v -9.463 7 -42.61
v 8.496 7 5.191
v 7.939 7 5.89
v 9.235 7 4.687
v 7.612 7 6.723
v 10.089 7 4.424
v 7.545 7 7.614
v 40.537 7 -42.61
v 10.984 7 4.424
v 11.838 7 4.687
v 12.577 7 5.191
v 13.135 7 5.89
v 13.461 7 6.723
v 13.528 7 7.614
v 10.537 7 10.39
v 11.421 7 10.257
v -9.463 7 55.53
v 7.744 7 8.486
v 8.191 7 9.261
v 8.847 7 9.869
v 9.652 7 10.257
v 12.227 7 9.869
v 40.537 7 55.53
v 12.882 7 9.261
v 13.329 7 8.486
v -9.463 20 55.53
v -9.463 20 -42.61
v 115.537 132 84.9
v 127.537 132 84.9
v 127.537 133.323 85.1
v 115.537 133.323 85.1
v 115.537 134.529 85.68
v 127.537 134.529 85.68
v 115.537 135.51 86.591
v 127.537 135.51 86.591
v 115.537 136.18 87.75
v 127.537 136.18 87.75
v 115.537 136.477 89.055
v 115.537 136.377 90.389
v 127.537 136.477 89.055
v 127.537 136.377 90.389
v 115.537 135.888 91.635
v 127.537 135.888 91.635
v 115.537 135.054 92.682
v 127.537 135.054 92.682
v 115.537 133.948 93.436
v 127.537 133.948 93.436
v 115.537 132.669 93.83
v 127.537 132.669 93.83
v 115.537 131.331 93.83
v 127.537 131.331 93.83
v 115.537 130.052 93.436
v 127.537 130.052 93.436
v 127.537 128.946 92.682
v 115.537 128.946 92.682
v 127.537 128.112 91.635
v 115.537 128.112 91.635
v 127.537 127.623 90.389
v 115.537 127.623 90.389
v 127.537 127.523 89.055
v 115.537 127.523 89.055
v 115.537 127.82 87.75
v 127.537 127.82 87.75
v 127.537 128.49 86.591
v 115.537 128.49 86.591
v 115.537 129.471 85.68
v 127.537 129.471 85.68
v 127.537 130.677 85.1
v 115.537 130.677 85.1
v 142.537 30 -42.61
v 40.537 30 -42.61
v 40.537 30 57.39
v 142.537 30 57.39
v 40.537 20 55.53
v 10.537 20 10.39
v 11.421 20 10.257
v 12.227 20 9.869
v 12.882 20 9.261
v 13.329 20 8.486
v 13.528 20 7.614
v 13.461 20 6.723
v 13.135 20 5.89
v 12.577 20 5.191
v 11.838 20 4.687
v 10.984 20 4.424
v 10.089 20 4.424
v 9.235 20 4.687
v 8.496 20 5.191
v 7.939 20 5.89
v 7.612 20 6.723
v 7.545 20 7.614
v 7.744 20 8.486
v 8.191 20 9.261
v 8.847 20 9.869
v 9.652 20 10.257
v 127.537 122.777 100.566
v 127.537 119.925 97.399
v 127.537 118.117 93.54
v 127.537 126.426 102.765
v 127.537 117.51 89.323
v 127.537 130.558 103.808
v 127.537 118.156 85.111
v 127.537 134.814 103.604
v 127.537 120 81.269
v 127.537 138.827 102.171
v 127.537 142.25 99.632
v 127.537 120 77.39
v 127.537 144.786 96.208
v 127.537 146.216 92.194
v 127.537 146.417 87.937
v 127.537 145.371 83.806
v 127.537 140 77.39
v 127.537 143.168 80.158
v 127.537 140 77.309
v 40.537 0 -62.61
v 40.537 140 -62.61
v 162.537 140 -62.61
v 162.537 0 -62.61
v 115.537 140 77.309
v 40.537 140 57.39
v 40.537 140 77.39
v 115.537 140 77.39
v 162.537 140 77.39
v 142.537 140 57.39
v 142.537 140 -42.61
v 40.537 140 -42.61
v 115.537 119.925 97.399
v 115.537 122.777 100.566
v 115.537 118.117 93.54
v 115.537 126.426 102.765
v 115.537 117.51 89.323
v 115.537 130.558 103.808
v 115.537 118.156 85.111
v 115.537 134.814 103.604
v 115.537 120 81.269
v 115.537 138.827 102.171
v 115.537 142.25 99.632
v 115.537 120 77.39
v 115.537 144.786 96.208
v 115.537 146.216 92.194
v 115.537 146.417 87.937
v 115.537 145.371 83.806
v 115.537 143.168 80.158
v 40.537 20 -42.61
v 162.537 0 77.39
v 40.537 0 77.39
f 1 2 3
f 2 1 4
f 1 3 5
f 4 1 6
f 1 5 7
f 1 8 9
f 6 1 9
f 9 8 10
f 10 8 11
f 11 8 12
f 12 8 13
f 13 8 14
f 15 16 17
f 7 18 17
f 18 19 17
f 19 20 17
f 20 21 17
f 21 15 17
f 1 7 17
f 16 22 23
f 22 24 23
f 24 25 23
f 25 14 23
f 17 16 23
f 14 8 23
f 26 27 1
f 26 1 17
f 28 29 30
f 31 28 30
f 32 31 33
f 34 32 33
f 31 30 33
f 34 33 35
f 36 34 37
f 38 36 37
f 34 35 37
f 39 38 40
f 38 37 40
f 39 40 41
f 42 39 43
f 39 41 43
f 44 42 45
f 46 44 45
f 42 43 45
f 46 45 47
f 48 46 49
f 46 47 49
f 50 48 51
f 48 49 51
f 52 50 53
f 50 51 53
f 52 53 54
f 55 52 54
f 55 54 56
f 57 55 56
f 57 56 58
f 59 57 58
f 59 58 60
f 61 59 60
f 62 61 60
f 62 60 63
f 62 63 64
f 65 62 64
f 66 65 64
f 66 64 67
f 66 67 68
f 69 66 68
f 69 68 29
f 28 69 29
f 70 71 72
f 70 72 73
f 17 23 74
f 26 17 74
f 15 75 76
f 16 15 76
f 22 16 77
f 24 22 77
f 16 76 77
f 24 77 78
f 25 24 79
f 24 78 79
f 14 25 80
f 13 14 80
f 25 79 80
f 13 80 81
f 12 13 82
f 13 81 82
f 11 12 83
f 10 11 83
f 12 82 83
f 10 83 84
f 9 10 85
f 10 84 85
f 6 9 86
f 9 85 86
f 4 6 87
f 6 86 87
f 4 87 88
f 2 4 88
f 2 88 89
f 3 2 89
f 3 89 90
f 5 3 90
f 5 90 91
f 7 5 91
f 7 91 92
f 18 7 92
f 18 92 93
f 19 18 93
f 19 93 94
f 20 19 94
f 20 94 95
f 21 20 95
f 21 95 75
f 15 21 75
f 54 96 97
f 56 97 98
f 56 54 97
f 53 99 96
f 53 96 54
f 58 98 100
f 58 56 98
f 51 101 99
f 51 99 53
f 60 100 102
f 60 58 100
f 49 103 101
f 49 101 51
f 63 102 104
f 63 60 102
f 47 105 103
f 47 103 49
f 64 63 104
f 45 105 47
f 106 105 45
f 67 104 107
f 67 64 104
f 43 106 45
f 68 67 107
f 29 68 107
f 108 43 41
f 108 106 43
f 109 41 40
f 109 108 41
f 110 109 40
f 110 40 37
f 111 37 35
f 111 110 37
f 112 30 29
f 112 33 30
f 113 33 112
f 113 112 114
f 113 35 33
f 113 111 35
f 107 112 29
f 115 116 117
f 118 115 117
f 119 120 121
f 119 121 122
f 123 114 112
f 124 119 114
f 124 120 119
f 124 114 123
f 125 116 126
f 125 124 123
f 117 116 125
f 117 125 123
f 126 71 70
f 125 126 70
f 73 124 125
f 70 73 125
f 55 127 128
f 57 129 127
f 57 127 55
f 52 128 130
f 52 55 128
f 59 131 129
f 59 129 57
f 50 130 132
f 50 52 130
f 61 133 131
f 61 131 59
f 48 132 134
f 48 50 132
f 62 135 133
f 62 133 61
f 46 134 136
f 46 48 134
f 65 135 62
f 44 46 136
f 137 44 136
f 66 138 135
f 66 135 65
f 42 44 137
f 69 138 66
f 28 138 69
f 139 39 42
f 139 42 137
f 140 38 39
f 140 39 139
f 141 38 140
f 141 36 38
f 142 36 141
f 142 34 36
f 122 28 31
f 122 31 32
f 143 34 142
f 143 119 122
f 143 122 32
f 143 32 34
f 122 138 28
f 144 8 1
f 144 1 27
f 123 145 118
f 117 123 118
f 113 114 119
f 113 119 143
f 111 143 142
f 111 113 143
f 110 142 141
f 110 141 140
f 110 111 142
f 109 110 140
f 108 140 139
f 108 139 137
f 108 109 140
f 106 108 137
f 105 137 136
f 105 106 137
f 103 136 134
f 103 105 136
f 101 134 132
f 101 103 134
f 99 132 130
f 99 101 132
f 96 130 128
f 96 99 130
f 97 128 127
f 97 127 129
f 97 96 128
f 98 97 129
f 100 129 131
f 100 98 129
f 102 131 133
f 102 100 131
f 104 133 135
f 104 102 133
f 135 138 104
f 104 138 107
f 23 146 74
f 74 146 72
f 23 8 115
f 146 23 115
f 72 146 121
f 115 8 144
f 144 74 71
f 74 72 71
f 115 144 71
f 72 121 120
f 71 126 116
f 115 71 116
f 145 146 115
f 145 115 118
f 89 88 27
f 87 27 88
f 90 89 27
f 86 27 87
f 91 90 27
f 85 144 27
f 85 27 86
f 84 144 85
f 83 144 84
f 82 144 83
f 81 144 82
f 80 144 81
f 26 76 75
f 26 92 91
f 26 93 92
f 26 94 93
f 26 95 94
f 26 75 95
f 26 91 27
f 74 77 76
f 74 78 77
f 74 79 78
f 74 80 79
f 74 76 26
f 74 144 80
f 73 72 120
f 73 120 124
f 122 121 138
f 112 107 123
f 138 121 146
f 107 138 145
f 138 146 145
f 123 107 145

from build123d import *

# Parameters (mm, degrees)
SKETCH_1_W          = 272
SKETCH_1_H          = 140
EXTRUDE_1_DEPTH     = 140
SKETCH_2_W          = 252
SKETCH_2_H          = 100
CUT_EXTRUDE_1_DEPTH = 110
SKETCH_8_W          = 12
SKETCH_8_H          = 12
EXTRUDE_2_DEPTH     = 10
SKETCH_9_R          = 14.49
SKETCH_9_R_2        = 4.49
EXTRUDE_1_2_DEPTH   = 12
SKETCH_11_R         = 4.49
CUT_EXTRUDE_5_DEPTH = 298.354040116
SKETCH_13_W         = 150
SKETCH_13_H         = 140
CUT_EXTRUDE_7_DEPTH = 239.346904019
SKETCH_14_W         = 98.139384751
SKETCH_14_H         = 13
EXTRUDE_3_DEPTH     = 50
SKETCH_15_R         = 3
CUT_EXTRUDE_8_DEPTH = 231.670688982


with BuildPart() as part:
    # 草圖1 → Extrude 1 (new body)
    with BuildSketch(Plane(origin=(0, 0, 0), x_dir=(1, 0, 0), z_dir=(0, 1, 0))):
        with Locations((26.536585366, -7.390243902)):
            Rectangle(SKETCH_1_W, SKETCH_1_H)
    extrude(amount=EXTRUDE_1_DEPTH)

    # 草圖2 → 除料-伸長1 (cut)
    with BuildSketch(Plane(origin=(0, 140, 0), x_dir=(1, 0, 0), z_dir=(0, 1, 0))):
        with Locations((16.536585366, -7.390243902)):
            Rectangle(SKETCH_2_W, SKETCH_2_H)
    extrude(amount=-CUT_EXTRUDE_1_DEPTH, mode=Mode.SUBTRACT)

    # 草圖8 → 填料-伸長2 (add)
    with BuildSketch(Plane.XY.offset(77.390243902)):
        with Locations((121.536585366, 126)):
            Rectangle(SKETCH_8_W, SKETCH_8_H)
    extrude(amount=EXTRUDE_2_DEPTH)

    # 草圖9 → Extrude 1 2 (add)
    with BuildSketch(Plane(origin=(127.536585366, 0, 0), x_dir=(0, 0, -1), z_dir=(1, 0, 0))):
        with Locations((-89.390243902, 132)):
            Circle(SKETCH_9_R)
        with Locations((-89.390243902, 132)):
            Circle(SKETCH_9_R_2, mode=Mode.SUBTRACT)
    extrude(amount=-EXTRUDE_1_2_DEPTH)

    # 草圖11 → 除料-伸長5 (cut, through all)
    with BuildSketch(Plane(origin=(127.536585366, 0, 0), x_dir=(0, 0, -1), z_dir=(1, 0, 0))):
        with Locations((-89.390243902, 132)):
            Circle(SKETCH_11_R)
    extrude(amount=-CUT_EXTRUDE_5_DEPTH, mode=Mode.SUBTRACT)

    # 草圖13 → 除料-伸長7 (cut, through all)
    with BuildSketch(Plane(origin=(0, 140, 0), x_dir=(1, 0, 0), z_dir=(0, 1, 0))):
        with Locations((-34.463414634, -7.390243902)):
            Rectangle(SKETCH_13_W, SKETCH_13_H)
    extrude(amount=-CUT_EXTRUDE_7_DEPTH, mode=Mode.SUBTRACT)

    # 草圖14 → 填料-伸長3 (add)
    with BuildSketch(Plane.ZY.offset(-40.536585366)):
        with Locations((6.459936277, 13.5)):
            Rectangle(SKETCH_14_W, SKETCH_14_H)
    extrude(amount=EXTRUDE_3_DEPTH)

    # 草圖15 → 除料-伸長8 (cut, through all)
    with BuildSketch(Plane(origin=(0, 20, 0), x_dir=(1, 0, 0), z_dir=(0, 1, 0))):
        with Locations(Location((10.536585366, -7.390243902, 0), (0, 0, 270))):
            Circle(SKETCH_15_R)
    extrude(amount=-CUT_EXTRUDE_8_DEPTH, mode=Mode.SUBTRACT)


solid = part.part
